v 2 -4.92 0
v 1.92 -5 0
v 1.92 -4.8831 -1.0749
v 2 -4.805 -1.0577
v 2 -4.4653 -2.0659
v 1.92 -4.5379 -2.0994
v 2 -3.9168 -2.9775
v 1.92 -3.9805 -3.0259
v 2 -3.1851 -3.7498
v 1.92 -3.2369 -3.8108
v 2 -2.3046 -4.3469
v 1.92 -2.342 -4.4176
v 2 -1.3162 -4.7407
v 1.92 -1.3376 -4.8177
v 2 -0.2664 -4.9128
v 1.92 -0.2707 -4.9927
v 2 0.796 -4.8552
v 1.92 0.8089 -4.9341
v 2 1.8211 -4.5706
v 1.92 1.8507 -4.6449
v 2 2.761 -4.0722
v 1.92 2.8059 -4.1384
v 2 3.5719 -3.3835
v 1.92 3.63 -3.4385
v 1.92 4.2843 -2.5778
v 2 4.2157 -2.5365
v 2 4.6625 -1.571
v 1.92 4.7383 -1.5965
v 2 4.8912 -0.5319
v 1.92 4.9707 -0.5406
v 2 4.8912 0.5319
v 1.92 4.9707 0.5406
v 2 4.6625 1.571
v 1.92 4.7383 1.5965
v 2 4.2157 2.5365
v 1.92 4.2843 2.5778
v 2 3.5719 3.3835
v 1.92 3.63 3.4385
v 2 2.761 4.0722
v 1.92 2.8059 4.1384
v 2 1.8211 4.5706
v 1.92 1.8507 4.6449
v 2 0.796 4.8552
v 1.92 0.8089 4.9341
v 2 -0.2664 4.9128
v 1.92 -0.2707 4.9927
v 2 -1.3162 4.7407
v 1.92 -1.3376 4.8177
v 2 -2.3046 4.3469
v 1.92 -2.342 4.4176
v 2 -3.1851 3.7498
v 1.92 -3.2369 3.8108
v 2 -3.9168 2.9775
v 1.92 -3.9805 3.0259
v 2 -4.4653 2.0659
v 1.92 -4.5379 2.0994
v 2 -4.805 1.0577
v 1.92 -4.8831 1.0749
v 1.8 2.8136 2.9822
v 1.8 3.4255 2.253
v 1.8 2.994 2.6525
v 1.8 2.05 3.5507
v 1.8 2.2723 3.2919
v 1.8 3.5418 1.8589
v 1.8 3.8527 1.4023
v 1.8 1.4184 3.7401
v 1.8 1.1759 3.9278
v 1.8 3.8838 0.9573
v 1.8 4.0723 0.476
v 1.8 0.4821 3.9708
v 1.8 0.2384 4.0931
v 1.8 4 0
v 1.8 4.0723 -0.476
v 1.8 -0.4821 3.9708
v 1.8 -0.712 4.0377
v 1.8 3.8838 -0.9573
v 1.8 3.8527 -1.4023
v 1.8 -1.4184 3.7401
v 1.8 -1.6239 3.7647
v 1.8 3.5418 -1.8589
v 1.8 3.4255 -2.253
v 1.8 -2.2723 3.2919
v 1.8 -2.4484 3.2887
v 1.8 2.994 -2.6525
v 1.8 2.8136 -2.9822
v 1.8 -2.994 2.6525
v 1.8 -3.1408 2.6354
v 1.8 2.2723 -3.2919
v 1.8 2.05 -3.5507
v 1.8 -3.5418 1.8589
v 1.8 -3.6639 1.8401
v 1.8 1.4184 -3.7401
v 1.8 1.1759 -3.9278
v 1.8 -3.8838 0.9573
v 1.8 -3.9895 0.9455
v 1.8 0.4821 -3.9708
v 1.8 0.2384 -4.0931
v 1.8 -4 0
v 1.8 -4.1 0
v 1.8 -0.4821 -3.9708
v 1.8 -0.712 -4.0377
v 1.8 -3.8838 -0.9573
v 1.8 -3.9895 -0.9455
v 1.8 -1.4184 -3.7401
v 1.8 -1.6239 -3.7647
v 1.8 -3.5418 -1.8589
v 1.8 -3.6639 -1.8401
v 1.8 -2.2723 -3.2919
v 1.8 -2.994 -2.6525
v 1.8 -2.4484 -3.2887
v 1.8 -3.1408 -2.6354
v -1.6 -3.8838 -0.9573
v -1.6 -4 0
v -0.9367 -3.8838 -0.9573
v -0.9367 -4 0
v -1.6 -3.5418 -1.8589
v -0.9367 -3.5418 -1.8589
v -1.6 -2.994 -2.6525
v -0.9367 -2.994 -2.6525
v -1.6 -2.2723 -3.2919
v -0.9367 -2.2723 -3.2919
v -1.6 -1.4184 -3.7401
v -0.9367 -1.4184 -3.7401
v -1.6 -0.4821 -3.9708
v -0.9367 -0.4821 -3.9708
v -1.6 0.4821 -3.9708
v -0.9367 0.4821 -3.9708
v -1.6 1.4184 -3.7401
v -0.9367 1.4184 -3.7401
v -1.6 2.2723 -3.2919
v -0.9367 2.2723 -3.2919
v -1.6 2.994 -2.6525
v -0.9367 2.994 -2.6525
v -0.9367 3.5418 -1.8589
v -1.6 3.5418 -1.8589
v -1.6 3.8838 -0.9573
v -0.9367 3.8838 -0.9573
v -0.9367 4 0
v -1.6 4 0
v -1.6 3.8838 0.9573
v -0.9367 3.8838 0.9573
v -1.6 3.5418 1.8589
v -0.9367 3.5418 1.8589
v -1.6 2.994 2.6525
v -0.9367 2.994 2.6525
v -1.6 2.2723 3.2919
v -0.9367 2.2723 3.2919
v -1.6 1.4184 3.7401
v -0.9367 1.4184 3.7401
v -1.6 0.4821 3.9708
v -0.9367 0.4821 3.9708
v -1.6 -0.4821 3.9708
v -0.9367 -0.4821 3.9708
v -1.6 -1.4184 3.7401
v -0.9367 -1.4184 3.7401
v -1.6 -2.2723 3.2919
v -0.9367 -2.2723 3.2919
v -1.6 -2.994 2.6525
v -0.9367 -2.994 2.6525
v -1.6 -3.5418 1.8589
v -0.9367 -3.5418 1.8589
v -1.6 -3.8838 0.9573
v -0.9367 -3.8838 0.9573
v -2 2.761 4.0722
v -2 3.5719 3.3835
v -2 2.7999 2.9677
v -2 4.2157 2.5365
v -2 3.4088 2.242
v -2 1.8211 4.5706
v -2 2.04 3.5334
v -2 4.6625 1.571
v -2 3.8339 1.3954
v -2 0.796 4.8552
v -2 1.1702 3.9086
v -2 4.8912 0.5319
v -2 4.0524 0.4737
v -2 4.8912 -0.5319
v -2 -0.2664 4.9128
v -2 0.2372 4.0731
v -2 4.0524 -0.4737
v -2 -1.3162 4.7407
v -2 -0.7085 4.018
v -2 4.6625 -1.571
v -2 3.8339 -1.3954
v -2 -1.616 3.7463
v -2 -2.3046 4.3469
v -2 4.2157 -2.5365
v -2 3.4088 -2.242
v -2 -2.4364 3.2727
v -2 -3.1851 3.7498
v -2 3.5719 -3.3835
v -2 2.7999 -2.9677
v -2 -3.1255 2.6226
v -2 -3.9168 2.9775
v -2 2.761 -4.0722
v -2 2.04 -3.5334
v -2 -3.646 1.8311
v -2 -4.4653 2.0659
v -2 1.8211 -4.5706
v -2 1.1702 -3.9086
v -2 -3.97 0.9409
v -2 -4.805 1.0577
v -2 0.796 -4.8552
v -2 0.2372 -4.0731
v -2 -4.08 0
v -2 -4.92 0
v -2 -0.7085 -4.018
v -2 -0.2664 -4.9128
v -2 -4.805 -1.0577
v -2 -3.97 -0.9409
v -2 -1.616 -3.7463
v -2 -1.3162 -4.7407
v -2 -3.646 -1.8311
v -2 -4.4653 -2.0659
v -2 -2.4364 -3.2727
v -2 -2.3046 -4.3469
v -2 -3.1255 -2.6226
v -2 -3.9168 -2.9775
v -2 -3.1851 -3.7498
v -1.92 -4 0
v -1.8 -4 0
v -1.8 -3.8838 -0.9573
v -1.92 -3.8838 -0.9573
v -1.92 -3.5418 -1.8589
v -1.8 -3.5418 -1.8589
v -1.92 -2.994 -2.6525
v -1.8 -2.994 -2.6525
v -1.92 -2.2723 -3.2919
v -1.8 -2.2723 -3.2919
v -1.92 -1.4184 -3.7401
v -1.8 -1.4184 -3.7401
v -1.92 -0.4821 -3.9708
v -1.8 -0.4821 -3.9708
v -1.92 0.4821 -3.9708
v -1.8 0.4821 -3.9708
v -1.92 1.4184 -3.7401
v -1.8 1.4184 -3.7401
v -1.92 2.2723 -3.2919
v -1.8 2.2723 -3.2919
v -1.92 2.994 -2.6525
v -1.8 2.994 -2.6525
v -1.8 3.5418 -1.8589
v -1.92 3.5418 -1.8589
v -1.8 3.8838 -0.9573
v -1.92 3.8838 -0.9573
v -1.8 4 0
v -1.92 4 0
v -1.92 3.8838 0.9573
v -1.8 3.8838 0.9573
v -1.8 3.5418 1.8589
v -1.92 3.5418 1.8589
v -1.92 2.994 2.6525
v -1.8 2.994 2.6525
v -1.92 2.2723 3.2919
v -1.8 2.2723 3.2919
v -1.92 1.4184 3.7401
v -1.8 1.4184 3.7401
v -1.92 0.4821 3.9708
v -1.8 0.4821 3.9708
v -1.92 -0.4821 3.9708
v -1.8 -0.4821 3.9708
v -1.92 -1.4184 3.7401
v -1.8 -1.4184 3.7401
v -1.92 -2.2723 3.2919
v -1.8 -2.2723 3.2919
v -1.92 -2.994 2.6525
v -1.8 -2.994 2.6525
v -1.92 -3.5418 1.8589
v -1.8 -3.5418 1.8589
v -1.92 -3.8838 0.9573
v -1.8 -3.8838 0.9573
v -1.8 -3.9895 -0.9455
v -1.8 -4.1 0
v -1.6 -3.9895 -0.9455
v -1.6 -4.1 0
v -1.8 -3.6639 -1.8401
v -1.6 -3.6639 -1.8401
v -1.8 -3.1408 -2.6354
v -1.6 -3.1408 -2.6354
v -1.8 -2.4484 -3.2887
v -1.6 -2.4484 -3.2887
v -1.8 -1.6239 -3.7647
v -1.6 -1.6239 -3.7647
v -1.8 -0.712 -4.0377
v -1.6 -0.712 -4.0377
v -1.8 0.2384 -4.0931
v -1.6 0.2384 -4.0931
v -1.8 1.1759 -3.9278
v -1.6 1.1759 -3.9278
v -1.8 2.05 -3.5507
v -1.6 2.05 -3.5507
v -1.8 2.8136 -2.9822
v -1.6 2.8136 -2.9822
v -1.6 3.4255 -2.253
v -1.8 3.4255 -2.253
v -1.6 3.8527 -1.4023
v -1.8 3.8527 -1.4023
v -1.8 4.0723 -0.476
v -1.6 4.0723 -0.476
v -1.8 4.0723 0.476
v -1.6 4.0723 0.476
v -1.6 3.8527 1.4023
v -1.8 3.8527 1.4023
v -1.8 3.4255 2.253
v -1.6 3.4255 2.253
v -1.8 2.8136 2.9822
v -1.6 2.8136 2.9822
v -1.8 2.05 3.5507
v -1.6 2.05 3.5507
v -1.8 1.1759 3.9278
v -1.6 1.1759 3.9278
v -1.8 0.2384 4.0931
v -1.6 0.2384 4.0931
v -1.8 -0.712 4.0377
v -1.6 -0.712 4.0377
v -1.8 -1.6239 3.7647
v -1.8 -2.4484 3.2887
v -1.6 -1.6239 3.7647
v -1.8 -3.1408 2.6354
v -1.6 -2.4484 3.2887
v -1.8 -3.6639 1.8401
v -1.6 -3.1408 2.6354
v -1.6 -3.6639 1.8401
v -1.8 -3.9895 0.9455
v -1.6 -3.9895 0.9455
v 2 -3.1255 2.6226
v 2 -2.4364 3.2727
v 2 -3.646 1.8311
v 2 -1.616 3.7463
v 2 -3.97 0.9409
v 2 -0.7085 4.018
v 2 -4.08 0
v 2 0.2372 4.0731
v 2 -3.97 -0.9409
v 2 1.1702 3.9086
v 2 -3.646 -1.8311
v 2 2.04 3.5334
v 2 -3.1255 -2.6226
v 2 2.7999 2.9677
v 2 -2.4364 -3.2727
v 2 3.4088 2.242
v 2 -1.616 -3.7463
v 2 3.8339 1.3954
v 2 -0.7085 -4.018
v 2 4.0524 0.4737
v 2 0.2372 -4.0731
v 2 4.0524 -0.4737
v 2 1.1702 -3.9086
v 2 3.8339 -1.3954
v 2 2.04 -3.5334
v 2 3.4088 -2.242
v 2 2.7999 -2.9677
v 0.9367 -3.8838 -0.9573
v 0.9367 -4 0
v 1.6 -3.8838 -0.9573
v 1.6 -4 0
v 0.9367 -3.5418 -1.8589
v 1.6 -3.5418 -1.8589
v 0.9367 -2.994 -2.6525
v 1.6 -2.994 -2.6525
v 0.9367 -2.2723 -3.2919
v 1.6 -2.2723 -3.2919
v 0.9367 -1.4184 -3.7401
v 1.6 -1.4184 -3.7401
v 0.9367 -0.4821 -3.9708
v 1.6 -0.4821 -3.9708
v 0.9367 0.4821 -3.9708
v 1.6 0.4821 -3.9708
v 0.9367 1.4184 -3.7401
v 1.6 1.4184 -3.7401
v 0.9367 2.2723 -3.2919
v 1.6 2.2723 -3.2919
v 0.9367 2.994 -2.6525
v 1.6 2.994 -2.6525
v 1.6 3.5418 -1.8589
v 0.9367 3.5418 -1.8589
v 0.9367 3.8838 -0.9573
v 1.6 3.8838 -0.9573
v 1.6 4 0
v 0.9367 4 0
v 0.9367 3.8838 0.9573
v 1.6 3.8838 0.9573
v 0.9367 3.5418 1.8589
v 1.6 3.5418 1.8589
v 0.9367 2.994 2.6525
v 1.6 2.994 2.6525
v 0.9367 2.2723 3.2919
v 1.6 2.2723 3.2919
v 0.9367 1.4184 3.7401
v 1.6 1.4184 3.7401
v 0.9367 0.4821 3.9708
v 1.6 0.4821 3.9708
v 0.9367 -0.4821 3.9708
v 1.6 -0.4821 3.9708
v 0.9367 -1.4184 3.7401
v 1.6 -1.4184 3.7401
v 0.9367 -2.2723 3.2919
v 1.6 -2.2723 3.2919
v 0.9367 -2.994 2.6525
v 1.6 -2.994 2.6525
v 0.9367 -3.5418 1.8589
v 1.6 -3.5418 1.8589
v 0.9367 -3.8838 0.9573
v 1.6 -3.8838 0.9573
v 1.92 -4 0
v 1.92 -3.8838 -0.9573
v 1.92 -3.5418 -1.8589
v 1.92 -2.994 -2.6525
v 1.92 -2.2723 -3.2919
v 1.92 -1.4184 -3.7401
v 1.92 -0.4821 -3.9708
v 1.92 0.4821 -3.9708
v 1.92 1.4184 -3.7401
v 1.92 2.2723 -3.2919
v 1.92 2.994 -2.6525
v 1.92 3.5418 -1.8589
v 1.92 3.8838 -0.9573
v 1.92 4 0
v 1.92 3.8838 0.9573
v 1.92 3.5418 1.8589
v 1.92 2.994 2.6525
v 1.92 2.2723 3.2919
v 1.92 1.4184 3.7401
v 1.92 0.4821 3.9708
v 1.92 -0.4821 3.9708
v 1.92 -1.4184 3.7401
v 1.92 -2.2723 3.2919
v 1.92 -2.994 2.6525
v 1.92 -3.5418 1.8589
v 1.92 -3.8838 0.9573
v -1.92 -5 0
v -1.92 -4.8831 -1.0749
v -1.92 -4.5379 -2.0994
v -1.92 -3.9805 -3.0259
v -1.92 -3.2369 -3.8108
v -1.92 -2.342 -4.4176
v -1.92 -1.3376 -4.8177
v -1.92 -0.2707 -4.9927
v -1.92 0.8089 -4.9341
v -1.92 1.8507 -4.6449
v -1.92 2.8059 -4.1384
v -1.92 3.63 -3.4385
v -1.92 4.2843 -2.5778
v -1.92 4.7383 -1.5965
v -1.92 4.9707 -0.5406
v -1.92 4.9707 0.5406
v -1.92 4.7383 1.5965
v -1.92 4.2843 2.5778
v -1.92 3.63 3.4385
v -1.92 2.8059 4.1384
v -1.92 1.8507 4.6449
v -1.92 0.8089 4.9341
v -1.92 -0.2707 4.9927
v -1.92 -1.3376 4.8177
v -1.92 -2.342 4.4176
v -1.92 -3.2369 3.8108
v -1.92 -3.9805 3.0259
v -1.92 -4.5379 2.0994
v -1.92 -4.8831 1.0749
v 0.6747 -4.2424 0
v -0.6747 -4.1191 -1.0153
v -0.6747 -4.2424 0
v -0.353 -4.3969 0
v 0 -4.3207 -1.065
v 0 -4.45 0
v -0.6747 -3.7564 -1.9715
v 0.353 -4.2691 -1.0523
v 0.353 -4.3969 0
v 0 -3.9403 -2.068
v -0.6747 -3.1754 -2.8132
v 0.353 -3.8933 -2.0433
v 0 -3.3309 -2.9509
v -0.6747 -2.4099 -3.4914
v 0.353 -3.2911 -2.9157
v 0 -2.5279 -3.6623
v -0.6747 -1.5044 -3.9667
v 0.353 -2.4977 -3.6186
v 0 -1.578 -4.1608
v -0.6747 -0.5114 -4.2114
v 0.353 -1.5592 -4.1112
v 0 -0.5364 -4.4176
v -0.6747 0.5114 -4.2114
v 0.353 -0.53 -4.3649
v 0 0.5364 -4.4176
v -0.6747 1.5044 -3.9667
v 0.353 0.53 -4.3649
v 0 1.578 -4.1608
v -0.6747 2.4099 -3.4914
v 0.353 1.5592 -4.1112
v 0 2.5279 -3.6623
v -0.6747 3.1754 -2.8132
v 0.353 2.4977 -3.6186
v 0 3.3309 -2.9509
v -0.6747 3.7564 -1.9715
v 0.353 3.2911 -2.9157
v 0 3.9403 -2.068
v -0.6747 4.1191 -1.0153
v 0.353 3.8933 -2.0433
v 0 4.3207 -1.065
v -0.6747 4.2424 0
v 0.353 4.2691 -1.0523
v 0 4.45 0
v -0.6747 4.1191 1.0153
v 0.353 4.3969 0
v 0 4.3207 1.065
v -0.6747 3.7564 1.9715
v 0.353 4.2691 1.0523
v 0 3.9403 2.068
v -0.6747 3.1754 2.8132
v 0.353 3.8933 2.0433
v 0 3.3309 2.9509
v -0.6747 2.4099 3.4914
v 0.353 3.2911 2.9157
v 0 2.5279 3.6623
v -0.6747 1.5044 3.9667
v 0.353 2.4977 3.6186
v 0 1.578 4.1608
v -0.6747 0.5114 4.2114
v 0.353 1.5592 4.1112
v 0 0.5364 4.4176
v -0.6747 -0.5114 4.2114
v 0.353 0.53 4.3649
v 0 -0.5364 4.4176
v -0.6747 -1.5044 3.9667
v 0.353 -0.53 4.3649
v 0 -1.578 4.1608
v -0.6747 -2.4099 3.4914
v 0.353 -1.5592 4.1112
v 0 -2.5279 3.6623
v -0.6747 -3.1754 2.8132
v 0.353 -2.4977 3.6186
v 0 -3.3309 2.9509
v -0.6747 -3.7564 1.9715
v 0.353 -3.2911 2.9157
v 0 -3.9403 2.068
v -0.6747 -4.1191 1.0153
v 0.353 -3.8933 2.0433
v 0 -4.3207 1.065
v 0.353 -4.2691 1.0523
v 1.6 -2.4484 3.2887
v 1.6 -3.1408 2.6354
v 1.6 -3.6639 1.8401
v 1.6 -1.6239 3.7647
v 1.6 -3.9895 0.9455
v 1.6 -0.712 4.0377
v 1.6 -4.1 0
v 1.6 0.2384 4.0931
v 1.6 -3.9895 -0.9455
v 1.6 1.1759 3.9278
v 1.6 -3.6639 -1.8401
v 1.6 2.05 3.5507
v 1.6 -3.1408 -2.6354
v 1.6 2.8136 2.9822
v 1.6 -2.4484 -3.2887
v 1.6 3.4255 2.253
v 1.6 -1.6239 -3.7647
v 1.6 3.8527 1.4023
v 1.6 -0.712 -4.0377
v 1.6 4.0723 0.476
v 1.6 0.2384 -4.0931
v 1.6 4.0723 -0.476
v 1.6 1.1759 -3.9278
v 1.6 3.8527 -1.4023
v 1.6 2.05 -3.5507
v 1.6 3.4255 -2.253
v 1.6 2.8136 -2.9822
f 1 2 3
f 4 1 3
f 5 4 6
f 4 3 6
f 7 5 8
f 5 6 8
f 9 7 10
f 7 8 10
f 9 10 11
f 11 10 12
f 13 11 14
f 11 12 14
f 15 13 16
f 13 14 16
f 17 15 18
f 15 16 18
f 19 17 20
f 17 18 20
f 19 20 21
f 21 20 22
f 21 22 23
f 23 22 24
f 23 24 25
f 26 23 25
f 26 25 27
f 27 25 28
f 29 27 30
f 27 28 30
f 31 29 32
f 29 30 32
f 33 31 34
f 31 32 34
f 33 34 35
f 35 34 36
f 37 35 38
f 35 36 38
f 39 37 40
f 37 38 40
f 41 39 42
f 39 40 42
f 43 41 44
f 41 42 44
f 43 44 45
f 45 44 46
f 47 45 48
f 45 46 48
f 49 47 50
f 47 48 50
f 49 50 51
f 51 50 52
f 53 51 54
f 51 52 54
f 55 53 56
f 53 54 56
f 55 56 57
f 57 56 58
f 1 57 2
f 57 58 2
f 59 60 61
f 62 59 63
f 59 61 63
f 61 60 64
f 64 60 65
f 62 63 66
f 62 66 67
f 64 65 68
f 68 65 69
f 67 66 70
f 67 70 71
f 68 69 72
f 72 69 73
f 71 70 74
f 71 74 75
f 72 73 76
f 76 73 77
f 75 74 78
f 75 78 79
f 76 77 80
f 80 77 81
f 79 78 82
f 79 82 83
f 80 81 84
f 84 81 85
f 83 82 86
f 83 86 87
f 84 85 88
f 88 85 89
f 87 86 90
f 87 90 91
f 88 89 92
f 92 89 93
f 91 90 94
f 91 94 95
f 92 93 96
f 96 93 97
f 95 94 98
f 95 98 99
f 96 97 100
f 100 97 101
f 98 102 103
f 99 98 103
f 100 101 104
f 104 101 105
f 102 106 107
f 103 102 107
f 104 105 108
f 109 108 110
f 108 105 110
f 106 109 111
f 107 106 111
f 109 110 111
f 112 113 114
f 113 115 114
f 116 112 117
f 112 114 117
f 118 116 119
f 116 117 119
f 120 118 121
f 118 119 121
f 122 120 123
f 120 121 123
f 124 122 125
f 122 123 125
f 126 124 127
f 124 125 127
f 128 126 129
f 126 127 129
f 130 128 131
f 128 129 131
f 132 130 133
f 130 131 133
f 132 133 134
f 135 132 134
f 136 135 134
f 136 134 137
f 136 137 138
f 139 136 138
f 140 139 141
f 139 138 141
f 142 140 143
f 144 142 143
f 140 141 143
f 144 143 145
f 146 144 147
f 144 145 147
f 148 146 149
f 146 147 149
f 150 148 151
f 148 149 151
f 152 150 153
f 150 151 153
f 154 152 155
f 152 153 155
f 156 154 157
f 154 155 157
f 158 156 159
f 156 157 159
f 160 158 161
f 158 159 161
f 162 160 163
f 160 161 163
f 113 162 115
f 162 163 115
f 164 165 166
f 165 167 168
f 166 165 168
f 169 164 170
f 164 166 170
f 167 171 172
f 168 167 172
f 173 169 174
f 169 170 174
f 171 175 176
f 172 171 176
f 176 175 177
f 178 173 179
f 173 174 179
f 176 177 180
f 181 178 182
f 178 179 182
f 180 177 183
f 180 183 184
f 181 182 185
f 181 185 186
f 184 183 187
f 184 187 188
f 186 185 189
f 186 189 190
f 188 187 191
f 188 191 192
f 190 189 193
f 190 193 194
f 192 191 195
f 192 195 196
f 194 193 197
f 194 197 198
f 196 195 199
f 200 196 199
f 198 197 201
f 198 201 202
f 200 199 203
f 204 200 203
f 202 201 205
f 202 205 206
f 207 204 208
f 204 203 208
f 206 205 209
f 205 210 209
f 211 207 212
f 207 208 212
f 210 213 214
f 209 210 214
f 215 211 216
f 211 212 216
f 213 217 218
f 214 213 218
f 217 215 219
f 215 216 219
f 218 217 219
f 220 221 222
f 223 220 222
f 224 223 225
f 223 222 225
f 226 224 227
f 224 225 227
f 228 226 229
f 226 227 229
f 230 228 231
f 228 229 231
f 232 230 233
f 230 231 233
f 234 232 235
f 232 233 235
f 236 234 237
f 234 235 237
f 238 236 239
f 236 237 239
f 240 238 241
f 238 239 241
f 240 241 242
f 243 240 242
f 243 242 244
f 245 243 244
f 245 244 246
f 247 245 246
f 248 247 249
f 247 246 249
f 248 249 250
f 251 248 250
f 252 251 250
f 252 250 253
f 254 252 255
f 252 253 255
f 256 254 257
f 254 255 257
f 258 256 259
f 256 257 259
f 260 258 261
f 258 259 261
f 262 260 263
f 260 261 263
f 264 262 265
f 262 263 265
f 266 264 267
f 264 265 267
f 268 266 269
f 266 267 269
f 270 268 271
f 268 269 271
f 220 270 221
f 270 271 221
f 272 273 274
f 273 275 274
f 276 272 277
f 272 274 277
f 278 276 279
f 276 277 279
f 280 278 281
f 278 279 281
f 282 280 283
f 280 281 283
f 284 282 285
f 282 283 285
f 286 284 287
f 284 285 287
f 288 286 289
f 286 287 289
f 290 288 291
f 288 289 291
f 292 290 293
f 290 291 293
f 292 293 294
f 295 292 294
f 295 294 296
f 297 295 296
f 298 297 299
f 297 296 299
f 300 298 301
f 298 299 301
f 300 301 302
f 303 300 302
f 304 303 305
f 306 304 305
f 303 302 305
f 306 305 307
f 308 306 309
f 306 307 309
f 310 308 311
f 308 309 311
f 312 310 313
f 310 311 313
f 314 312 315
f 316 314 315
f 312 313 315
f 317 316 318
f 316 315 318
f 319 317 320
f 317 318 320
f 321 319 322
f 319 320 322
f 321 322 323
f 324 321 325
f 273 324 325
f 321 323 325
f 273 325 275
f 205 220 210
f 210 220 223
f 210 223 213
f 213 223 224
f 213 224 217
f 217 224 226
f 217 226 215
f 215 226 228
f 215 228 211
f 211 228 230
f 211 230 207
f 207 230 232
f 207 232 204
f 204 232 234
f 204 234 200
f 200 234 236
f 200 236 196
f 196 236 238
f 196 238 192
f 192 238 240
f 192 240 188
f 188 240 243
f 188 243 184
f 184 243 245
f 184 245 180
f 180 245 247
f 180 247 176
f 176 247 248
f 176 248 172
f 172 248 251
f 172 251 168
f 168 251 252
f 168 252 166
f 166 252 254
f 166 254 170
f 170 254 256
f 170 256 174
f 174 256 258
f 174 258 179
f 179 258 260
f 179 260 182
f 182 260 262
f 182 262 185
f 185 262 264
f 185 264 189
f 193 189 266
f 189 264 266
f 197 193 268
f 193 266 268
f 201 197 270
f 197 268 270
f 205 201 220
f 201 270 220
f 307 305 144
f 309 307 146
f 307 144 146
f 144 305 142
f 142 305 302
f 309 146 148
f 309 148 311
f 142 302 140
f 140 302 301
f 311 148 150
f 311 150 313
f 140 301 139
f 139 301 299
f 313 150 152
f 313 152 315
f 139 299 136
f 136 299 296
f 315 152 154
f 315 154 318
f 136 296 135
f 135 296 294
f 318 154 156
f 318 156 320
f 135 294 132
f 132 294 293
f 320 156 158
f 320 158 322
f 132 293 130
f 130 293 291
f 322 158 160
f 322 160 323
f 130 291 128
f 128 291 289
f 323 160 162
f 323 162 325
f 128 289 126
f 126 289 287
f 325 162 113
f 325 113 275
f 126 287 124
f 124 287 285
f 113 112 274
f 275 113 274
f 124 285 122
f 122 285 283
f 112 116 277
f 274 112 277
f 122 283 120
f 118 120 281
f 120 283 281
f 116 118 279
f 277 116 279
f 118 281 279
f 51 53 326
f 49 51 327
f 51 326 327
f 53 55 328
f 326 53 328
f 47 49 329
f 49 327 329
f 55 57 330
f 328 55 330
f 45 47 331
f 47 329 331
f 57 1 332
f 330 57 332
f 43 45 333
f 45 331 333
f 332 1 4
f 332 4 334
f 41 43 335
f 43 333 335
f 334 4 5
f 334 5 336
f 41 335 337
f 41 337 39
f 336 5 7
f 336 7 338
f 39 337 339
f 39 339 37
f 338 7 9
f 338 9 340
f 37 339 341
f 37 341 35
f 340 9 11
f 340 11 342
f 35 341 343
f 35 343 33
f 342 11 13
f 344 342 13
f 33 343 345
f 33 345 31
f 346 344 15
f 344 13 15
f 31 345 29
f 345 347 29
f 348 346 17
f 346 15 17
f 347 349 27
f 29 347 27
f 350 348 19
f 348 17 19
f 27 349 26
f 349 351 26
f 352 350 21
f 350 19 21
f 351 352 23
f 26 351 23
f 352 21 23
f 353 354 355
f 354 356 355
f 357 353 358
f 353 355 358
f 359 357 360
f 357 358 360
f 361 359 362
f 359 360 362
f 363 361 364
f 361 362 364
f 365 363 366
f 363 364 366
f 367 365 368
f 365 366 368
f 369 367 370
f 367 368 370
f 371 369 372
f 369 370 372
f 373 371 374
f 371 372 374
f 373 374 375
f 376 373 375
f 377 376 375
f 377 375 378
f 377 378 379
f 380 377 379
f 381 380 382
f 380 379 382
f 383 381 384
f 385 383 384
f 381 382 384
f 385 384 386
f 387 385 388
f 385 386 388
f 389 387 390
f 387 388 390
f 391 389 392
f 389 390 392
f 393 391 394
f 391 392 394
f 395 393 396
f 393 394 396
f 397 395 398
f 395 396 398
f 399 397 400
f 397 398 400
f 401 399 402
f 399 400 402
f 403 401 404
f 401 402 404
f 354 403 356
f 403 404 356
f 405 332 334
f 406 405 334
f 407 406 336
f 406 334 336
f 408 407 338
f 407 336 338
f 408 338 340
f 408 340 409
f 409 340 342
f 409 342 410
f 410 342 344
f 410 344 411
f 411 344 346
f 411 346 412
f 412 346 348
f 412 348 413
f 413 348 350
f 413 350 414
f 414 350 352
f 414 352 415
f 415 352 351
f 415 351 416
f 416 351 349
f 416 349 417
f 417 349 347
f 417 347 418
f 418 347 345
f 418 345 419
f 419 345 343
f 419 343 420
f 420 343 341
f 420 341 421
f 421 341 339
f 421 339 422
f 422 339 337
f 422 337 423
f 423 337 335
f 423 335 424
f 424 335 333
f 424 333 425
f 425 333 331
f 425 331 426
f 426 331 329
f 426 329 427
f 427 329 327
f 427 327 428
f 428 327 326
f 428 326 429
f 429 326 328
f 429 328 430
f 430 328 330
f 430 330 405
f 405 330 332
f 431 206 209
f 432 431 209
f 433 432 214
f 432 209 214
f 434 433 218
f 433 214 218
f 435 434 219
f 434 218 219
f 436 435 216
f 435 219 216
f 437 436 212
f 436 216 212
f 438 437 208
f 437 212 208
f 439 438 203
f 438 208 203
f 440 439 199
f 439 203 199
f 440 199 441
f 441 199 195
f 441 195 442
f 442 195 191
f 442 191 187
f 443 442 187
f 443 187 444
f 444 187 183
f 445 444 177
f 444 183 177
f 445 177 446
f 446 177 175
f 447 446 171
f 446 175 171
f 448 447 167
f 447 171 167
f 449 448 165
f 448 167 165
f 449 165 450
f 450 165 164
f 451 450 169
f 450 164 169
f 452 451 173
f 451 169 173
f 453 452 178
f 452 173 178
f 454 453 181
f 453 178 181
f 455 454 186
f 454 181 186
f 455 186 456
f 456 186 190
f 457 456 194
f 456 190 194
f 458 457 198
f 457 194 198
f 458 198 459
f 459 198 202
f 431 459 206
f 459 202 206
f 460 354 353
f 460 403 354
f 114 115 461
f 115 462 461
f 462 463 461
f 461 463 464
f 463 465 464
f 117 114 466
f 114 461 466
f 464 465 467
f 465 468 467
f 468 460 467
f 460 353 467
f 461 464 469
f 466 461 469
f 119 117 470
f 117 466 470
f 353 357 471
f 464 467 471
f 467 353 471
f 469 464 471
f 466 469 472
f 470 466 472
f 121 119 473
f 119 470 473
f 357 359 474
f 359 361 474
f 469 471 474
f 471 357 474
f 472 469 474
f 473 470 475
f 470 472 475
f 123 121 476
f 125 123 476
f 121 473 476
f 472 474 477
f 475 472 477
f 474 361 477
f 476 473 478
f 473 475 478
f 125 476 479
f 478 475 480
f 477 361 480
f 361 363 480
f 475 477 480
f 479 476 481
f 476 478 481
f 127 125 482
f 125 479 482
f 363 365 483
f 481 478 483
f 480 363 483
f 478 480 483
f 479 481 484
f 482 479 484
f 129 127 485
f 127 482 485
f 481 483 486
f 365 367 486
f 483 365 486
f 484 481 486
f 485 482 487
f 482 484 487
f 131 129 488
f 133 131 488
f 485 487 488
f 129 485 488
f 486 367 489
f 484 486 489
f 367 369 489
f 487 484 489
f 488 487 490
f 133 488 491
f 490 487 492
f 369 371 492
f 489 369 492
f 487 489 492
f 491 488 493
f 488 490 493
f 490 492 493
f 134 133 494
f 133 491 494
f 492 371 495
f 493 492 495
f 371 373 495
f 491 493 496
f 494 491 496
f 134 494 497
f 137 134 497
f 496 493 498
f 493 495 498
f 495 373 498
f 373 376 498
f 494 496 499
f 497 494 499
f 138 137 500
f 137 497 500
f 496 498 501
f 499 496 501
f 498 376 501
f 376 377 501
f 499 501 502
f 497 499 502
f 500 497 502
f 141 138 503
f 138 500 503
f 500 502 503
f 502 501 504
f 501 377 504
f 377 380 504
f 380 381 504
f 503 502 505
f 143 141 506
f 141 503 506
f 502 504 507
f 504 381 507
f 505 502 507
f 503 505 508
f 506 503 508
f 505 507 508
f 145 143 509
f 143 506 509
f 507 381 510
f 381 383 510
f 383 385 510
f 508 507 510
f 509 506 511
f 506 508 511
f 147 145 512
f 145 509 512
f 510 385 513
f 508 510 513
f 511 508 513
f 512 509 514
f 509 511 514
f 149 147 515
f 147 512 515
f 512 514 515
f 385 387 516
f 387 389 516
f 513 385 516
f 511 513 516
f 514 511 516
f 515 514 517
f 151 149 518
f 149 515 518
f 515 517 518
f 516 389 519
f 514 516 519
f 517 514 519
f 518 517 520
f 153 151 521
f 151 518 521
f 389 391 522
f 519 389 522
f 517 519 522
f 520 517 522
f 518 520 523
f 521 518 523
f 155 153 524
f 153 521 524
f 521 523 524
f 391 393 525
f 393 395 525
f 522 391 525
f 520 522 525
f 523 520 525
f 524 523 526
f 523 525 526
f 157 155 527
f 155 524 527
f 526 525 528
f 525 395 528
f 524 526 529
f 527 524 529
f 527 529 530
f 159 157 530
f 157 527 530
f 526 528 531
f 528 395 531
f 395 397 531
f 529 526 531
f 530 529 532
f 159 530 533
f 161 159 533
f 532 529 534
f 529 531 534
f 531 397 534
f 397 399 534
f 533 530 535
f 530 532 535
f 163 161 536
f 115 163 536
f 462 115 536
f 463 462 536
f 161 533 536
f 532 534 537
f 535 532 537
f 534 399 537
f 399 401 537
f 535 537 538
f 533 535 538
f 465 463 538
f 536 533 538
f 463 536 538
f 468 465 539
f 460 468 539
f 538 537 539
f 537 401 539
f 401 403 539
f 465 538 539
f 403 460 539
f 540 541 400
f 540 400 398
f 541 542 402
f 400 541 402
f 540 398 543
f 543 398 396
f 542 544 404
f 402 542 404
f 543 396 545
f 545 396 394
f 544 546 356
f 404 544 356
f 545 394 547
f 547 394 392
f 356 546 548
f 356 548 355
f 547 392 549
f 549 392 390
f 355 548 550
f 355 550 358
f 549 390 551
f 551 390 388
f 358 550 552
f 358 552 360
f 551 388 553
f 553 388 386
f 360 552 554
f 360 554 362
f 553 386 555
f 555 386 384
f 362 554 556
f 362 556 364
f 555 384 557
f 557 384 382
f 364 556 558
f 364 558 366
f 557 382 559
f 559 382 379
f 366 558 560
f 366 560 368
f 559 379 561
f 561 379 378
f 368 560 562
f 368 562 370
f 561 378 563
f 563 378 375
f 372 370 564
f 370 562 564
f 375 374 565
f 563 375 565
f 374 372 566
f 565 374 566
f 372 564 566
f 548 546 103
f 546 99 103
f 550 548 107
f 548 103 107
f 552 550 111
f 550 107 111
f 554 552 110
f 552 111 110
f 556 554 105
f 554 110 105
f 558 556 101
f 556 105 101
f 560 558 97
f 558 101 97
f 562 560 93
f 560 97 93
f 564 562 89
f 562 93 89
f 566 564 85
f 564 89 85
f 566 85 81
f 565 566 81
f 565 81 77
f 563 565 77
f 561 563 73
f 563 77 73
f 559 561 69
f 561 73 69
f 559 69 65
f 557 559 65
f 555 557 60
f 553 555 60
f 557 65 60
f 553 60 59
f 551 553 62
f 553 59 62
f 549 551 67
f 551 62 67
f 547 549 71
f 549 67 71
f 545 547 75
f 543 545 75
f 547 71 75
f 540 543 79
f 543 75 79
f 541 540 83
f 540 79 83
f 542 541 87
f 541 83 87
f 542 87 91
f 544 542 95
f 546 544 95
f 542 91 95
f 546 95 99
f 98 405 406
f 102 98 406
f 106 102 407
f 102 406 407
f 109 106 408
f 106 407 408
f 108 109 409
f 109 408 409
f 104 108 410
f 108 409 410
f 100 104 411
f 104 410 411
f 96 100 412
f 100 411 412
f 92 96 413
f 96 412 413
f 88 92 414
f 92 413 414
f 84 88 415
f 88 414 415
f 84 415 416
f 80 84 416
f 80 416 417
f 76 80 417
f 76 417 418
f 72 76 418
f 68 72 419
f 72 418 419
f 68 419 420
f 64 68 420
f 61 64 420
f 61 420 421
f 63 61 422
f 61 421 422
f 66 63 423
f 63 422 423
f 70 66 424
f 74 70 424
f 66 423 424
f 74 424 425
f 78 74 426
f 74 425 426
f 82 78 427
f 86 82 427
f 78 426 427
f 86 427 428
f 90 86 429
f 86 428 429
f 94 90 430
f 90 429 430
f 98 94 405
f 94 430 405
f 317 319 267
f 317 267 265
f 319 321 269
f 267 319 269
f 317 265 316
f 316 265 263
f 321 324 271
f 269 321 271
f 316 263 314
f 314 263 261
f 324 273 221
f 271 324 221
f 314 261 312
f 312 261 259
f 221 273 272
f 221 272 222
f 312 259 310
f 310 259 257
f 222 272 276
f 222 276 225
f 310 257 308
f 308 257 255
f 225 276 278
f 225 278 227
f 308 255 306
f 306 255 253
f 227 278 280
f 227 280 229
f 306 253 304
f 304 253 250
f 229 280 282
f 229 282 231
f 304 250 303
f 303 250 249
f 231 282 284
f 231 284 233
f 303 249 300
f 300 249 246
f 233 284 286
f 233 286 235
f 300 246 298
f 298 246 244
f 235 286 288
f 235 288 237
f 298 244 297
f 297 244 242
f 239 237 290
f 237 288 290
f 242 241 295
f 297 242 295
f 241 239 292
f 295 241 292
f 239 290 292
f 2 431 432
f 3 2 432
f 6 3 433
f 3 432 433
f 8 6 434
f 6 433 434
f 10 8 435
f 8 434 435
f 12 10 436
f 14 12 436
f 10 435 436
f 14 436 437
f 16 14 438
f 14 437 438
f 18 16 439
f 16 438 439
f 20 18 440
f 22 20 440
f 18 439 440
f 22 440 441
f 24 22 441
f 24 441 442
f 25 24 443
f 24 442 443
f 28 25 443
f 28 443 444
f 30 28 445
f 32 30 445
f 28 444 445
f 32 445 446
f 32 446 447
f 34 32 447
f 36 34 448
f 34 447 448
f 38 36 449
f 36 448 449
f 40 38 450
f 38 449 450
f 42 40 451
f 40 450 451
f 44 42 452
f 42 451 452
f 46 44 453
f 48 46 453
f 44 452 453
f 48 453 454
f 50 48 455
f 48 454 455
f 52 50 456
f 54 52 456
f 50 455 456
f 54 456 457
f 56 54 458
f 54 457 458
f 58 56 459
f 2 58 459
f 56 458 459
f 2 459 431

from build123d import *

# Parameters (mm, degrees)
CHAMFER1_SIZE = 0.08


with BuildPart() as part:
    # Sketch1 → Revolve1 (revolve)
    with BuildSketch(Plane.XY):
        with BuildLine():
            Line((-1.6, -4), (-0.9367497, -4))
            ThreePointArc((-0.9367497, -4), (0, -4.45), (0.9367497, -4))
            Line((0.9367497, -4), (1.6, -4))
            Line((1.6, -4), (1.6, -4.1))
            Line((1.6, -4.1), (1.8, -4.1))
            Line((1.8, -4.1), (1.8, -4))
            Line((1.8, -4), (2, -4))
            Line((2, -4), (2, -5))
            Line((2, -5), (-2, -5))
            Line((-2, -5), (-2, -4))
            Line((-2, -4), (-1.8, -4))
            Line((-1.8, -4), (-1.8, -4.1))
            Line((-1.8, -4.1), (-1.6, -4.1))
            Line((-1.6, -4.1), (-1.6, -4))
        make_face()
    revolve(axis=Axis((-6.429017492, 0, 0), (1, 0, 0)))

    # Chamfer1
    chamfer1_edges = [part.edges().sort_by_distance(p)[0] for p in [
        (2, 5, 0),
        (-2, 5, 0),
        (-2, 4, 0),
        (2, 4, 0),
    ]]
    chamfer(chamfer1_edges, length=CHAMFER1_SIZE)


solid = part.part
